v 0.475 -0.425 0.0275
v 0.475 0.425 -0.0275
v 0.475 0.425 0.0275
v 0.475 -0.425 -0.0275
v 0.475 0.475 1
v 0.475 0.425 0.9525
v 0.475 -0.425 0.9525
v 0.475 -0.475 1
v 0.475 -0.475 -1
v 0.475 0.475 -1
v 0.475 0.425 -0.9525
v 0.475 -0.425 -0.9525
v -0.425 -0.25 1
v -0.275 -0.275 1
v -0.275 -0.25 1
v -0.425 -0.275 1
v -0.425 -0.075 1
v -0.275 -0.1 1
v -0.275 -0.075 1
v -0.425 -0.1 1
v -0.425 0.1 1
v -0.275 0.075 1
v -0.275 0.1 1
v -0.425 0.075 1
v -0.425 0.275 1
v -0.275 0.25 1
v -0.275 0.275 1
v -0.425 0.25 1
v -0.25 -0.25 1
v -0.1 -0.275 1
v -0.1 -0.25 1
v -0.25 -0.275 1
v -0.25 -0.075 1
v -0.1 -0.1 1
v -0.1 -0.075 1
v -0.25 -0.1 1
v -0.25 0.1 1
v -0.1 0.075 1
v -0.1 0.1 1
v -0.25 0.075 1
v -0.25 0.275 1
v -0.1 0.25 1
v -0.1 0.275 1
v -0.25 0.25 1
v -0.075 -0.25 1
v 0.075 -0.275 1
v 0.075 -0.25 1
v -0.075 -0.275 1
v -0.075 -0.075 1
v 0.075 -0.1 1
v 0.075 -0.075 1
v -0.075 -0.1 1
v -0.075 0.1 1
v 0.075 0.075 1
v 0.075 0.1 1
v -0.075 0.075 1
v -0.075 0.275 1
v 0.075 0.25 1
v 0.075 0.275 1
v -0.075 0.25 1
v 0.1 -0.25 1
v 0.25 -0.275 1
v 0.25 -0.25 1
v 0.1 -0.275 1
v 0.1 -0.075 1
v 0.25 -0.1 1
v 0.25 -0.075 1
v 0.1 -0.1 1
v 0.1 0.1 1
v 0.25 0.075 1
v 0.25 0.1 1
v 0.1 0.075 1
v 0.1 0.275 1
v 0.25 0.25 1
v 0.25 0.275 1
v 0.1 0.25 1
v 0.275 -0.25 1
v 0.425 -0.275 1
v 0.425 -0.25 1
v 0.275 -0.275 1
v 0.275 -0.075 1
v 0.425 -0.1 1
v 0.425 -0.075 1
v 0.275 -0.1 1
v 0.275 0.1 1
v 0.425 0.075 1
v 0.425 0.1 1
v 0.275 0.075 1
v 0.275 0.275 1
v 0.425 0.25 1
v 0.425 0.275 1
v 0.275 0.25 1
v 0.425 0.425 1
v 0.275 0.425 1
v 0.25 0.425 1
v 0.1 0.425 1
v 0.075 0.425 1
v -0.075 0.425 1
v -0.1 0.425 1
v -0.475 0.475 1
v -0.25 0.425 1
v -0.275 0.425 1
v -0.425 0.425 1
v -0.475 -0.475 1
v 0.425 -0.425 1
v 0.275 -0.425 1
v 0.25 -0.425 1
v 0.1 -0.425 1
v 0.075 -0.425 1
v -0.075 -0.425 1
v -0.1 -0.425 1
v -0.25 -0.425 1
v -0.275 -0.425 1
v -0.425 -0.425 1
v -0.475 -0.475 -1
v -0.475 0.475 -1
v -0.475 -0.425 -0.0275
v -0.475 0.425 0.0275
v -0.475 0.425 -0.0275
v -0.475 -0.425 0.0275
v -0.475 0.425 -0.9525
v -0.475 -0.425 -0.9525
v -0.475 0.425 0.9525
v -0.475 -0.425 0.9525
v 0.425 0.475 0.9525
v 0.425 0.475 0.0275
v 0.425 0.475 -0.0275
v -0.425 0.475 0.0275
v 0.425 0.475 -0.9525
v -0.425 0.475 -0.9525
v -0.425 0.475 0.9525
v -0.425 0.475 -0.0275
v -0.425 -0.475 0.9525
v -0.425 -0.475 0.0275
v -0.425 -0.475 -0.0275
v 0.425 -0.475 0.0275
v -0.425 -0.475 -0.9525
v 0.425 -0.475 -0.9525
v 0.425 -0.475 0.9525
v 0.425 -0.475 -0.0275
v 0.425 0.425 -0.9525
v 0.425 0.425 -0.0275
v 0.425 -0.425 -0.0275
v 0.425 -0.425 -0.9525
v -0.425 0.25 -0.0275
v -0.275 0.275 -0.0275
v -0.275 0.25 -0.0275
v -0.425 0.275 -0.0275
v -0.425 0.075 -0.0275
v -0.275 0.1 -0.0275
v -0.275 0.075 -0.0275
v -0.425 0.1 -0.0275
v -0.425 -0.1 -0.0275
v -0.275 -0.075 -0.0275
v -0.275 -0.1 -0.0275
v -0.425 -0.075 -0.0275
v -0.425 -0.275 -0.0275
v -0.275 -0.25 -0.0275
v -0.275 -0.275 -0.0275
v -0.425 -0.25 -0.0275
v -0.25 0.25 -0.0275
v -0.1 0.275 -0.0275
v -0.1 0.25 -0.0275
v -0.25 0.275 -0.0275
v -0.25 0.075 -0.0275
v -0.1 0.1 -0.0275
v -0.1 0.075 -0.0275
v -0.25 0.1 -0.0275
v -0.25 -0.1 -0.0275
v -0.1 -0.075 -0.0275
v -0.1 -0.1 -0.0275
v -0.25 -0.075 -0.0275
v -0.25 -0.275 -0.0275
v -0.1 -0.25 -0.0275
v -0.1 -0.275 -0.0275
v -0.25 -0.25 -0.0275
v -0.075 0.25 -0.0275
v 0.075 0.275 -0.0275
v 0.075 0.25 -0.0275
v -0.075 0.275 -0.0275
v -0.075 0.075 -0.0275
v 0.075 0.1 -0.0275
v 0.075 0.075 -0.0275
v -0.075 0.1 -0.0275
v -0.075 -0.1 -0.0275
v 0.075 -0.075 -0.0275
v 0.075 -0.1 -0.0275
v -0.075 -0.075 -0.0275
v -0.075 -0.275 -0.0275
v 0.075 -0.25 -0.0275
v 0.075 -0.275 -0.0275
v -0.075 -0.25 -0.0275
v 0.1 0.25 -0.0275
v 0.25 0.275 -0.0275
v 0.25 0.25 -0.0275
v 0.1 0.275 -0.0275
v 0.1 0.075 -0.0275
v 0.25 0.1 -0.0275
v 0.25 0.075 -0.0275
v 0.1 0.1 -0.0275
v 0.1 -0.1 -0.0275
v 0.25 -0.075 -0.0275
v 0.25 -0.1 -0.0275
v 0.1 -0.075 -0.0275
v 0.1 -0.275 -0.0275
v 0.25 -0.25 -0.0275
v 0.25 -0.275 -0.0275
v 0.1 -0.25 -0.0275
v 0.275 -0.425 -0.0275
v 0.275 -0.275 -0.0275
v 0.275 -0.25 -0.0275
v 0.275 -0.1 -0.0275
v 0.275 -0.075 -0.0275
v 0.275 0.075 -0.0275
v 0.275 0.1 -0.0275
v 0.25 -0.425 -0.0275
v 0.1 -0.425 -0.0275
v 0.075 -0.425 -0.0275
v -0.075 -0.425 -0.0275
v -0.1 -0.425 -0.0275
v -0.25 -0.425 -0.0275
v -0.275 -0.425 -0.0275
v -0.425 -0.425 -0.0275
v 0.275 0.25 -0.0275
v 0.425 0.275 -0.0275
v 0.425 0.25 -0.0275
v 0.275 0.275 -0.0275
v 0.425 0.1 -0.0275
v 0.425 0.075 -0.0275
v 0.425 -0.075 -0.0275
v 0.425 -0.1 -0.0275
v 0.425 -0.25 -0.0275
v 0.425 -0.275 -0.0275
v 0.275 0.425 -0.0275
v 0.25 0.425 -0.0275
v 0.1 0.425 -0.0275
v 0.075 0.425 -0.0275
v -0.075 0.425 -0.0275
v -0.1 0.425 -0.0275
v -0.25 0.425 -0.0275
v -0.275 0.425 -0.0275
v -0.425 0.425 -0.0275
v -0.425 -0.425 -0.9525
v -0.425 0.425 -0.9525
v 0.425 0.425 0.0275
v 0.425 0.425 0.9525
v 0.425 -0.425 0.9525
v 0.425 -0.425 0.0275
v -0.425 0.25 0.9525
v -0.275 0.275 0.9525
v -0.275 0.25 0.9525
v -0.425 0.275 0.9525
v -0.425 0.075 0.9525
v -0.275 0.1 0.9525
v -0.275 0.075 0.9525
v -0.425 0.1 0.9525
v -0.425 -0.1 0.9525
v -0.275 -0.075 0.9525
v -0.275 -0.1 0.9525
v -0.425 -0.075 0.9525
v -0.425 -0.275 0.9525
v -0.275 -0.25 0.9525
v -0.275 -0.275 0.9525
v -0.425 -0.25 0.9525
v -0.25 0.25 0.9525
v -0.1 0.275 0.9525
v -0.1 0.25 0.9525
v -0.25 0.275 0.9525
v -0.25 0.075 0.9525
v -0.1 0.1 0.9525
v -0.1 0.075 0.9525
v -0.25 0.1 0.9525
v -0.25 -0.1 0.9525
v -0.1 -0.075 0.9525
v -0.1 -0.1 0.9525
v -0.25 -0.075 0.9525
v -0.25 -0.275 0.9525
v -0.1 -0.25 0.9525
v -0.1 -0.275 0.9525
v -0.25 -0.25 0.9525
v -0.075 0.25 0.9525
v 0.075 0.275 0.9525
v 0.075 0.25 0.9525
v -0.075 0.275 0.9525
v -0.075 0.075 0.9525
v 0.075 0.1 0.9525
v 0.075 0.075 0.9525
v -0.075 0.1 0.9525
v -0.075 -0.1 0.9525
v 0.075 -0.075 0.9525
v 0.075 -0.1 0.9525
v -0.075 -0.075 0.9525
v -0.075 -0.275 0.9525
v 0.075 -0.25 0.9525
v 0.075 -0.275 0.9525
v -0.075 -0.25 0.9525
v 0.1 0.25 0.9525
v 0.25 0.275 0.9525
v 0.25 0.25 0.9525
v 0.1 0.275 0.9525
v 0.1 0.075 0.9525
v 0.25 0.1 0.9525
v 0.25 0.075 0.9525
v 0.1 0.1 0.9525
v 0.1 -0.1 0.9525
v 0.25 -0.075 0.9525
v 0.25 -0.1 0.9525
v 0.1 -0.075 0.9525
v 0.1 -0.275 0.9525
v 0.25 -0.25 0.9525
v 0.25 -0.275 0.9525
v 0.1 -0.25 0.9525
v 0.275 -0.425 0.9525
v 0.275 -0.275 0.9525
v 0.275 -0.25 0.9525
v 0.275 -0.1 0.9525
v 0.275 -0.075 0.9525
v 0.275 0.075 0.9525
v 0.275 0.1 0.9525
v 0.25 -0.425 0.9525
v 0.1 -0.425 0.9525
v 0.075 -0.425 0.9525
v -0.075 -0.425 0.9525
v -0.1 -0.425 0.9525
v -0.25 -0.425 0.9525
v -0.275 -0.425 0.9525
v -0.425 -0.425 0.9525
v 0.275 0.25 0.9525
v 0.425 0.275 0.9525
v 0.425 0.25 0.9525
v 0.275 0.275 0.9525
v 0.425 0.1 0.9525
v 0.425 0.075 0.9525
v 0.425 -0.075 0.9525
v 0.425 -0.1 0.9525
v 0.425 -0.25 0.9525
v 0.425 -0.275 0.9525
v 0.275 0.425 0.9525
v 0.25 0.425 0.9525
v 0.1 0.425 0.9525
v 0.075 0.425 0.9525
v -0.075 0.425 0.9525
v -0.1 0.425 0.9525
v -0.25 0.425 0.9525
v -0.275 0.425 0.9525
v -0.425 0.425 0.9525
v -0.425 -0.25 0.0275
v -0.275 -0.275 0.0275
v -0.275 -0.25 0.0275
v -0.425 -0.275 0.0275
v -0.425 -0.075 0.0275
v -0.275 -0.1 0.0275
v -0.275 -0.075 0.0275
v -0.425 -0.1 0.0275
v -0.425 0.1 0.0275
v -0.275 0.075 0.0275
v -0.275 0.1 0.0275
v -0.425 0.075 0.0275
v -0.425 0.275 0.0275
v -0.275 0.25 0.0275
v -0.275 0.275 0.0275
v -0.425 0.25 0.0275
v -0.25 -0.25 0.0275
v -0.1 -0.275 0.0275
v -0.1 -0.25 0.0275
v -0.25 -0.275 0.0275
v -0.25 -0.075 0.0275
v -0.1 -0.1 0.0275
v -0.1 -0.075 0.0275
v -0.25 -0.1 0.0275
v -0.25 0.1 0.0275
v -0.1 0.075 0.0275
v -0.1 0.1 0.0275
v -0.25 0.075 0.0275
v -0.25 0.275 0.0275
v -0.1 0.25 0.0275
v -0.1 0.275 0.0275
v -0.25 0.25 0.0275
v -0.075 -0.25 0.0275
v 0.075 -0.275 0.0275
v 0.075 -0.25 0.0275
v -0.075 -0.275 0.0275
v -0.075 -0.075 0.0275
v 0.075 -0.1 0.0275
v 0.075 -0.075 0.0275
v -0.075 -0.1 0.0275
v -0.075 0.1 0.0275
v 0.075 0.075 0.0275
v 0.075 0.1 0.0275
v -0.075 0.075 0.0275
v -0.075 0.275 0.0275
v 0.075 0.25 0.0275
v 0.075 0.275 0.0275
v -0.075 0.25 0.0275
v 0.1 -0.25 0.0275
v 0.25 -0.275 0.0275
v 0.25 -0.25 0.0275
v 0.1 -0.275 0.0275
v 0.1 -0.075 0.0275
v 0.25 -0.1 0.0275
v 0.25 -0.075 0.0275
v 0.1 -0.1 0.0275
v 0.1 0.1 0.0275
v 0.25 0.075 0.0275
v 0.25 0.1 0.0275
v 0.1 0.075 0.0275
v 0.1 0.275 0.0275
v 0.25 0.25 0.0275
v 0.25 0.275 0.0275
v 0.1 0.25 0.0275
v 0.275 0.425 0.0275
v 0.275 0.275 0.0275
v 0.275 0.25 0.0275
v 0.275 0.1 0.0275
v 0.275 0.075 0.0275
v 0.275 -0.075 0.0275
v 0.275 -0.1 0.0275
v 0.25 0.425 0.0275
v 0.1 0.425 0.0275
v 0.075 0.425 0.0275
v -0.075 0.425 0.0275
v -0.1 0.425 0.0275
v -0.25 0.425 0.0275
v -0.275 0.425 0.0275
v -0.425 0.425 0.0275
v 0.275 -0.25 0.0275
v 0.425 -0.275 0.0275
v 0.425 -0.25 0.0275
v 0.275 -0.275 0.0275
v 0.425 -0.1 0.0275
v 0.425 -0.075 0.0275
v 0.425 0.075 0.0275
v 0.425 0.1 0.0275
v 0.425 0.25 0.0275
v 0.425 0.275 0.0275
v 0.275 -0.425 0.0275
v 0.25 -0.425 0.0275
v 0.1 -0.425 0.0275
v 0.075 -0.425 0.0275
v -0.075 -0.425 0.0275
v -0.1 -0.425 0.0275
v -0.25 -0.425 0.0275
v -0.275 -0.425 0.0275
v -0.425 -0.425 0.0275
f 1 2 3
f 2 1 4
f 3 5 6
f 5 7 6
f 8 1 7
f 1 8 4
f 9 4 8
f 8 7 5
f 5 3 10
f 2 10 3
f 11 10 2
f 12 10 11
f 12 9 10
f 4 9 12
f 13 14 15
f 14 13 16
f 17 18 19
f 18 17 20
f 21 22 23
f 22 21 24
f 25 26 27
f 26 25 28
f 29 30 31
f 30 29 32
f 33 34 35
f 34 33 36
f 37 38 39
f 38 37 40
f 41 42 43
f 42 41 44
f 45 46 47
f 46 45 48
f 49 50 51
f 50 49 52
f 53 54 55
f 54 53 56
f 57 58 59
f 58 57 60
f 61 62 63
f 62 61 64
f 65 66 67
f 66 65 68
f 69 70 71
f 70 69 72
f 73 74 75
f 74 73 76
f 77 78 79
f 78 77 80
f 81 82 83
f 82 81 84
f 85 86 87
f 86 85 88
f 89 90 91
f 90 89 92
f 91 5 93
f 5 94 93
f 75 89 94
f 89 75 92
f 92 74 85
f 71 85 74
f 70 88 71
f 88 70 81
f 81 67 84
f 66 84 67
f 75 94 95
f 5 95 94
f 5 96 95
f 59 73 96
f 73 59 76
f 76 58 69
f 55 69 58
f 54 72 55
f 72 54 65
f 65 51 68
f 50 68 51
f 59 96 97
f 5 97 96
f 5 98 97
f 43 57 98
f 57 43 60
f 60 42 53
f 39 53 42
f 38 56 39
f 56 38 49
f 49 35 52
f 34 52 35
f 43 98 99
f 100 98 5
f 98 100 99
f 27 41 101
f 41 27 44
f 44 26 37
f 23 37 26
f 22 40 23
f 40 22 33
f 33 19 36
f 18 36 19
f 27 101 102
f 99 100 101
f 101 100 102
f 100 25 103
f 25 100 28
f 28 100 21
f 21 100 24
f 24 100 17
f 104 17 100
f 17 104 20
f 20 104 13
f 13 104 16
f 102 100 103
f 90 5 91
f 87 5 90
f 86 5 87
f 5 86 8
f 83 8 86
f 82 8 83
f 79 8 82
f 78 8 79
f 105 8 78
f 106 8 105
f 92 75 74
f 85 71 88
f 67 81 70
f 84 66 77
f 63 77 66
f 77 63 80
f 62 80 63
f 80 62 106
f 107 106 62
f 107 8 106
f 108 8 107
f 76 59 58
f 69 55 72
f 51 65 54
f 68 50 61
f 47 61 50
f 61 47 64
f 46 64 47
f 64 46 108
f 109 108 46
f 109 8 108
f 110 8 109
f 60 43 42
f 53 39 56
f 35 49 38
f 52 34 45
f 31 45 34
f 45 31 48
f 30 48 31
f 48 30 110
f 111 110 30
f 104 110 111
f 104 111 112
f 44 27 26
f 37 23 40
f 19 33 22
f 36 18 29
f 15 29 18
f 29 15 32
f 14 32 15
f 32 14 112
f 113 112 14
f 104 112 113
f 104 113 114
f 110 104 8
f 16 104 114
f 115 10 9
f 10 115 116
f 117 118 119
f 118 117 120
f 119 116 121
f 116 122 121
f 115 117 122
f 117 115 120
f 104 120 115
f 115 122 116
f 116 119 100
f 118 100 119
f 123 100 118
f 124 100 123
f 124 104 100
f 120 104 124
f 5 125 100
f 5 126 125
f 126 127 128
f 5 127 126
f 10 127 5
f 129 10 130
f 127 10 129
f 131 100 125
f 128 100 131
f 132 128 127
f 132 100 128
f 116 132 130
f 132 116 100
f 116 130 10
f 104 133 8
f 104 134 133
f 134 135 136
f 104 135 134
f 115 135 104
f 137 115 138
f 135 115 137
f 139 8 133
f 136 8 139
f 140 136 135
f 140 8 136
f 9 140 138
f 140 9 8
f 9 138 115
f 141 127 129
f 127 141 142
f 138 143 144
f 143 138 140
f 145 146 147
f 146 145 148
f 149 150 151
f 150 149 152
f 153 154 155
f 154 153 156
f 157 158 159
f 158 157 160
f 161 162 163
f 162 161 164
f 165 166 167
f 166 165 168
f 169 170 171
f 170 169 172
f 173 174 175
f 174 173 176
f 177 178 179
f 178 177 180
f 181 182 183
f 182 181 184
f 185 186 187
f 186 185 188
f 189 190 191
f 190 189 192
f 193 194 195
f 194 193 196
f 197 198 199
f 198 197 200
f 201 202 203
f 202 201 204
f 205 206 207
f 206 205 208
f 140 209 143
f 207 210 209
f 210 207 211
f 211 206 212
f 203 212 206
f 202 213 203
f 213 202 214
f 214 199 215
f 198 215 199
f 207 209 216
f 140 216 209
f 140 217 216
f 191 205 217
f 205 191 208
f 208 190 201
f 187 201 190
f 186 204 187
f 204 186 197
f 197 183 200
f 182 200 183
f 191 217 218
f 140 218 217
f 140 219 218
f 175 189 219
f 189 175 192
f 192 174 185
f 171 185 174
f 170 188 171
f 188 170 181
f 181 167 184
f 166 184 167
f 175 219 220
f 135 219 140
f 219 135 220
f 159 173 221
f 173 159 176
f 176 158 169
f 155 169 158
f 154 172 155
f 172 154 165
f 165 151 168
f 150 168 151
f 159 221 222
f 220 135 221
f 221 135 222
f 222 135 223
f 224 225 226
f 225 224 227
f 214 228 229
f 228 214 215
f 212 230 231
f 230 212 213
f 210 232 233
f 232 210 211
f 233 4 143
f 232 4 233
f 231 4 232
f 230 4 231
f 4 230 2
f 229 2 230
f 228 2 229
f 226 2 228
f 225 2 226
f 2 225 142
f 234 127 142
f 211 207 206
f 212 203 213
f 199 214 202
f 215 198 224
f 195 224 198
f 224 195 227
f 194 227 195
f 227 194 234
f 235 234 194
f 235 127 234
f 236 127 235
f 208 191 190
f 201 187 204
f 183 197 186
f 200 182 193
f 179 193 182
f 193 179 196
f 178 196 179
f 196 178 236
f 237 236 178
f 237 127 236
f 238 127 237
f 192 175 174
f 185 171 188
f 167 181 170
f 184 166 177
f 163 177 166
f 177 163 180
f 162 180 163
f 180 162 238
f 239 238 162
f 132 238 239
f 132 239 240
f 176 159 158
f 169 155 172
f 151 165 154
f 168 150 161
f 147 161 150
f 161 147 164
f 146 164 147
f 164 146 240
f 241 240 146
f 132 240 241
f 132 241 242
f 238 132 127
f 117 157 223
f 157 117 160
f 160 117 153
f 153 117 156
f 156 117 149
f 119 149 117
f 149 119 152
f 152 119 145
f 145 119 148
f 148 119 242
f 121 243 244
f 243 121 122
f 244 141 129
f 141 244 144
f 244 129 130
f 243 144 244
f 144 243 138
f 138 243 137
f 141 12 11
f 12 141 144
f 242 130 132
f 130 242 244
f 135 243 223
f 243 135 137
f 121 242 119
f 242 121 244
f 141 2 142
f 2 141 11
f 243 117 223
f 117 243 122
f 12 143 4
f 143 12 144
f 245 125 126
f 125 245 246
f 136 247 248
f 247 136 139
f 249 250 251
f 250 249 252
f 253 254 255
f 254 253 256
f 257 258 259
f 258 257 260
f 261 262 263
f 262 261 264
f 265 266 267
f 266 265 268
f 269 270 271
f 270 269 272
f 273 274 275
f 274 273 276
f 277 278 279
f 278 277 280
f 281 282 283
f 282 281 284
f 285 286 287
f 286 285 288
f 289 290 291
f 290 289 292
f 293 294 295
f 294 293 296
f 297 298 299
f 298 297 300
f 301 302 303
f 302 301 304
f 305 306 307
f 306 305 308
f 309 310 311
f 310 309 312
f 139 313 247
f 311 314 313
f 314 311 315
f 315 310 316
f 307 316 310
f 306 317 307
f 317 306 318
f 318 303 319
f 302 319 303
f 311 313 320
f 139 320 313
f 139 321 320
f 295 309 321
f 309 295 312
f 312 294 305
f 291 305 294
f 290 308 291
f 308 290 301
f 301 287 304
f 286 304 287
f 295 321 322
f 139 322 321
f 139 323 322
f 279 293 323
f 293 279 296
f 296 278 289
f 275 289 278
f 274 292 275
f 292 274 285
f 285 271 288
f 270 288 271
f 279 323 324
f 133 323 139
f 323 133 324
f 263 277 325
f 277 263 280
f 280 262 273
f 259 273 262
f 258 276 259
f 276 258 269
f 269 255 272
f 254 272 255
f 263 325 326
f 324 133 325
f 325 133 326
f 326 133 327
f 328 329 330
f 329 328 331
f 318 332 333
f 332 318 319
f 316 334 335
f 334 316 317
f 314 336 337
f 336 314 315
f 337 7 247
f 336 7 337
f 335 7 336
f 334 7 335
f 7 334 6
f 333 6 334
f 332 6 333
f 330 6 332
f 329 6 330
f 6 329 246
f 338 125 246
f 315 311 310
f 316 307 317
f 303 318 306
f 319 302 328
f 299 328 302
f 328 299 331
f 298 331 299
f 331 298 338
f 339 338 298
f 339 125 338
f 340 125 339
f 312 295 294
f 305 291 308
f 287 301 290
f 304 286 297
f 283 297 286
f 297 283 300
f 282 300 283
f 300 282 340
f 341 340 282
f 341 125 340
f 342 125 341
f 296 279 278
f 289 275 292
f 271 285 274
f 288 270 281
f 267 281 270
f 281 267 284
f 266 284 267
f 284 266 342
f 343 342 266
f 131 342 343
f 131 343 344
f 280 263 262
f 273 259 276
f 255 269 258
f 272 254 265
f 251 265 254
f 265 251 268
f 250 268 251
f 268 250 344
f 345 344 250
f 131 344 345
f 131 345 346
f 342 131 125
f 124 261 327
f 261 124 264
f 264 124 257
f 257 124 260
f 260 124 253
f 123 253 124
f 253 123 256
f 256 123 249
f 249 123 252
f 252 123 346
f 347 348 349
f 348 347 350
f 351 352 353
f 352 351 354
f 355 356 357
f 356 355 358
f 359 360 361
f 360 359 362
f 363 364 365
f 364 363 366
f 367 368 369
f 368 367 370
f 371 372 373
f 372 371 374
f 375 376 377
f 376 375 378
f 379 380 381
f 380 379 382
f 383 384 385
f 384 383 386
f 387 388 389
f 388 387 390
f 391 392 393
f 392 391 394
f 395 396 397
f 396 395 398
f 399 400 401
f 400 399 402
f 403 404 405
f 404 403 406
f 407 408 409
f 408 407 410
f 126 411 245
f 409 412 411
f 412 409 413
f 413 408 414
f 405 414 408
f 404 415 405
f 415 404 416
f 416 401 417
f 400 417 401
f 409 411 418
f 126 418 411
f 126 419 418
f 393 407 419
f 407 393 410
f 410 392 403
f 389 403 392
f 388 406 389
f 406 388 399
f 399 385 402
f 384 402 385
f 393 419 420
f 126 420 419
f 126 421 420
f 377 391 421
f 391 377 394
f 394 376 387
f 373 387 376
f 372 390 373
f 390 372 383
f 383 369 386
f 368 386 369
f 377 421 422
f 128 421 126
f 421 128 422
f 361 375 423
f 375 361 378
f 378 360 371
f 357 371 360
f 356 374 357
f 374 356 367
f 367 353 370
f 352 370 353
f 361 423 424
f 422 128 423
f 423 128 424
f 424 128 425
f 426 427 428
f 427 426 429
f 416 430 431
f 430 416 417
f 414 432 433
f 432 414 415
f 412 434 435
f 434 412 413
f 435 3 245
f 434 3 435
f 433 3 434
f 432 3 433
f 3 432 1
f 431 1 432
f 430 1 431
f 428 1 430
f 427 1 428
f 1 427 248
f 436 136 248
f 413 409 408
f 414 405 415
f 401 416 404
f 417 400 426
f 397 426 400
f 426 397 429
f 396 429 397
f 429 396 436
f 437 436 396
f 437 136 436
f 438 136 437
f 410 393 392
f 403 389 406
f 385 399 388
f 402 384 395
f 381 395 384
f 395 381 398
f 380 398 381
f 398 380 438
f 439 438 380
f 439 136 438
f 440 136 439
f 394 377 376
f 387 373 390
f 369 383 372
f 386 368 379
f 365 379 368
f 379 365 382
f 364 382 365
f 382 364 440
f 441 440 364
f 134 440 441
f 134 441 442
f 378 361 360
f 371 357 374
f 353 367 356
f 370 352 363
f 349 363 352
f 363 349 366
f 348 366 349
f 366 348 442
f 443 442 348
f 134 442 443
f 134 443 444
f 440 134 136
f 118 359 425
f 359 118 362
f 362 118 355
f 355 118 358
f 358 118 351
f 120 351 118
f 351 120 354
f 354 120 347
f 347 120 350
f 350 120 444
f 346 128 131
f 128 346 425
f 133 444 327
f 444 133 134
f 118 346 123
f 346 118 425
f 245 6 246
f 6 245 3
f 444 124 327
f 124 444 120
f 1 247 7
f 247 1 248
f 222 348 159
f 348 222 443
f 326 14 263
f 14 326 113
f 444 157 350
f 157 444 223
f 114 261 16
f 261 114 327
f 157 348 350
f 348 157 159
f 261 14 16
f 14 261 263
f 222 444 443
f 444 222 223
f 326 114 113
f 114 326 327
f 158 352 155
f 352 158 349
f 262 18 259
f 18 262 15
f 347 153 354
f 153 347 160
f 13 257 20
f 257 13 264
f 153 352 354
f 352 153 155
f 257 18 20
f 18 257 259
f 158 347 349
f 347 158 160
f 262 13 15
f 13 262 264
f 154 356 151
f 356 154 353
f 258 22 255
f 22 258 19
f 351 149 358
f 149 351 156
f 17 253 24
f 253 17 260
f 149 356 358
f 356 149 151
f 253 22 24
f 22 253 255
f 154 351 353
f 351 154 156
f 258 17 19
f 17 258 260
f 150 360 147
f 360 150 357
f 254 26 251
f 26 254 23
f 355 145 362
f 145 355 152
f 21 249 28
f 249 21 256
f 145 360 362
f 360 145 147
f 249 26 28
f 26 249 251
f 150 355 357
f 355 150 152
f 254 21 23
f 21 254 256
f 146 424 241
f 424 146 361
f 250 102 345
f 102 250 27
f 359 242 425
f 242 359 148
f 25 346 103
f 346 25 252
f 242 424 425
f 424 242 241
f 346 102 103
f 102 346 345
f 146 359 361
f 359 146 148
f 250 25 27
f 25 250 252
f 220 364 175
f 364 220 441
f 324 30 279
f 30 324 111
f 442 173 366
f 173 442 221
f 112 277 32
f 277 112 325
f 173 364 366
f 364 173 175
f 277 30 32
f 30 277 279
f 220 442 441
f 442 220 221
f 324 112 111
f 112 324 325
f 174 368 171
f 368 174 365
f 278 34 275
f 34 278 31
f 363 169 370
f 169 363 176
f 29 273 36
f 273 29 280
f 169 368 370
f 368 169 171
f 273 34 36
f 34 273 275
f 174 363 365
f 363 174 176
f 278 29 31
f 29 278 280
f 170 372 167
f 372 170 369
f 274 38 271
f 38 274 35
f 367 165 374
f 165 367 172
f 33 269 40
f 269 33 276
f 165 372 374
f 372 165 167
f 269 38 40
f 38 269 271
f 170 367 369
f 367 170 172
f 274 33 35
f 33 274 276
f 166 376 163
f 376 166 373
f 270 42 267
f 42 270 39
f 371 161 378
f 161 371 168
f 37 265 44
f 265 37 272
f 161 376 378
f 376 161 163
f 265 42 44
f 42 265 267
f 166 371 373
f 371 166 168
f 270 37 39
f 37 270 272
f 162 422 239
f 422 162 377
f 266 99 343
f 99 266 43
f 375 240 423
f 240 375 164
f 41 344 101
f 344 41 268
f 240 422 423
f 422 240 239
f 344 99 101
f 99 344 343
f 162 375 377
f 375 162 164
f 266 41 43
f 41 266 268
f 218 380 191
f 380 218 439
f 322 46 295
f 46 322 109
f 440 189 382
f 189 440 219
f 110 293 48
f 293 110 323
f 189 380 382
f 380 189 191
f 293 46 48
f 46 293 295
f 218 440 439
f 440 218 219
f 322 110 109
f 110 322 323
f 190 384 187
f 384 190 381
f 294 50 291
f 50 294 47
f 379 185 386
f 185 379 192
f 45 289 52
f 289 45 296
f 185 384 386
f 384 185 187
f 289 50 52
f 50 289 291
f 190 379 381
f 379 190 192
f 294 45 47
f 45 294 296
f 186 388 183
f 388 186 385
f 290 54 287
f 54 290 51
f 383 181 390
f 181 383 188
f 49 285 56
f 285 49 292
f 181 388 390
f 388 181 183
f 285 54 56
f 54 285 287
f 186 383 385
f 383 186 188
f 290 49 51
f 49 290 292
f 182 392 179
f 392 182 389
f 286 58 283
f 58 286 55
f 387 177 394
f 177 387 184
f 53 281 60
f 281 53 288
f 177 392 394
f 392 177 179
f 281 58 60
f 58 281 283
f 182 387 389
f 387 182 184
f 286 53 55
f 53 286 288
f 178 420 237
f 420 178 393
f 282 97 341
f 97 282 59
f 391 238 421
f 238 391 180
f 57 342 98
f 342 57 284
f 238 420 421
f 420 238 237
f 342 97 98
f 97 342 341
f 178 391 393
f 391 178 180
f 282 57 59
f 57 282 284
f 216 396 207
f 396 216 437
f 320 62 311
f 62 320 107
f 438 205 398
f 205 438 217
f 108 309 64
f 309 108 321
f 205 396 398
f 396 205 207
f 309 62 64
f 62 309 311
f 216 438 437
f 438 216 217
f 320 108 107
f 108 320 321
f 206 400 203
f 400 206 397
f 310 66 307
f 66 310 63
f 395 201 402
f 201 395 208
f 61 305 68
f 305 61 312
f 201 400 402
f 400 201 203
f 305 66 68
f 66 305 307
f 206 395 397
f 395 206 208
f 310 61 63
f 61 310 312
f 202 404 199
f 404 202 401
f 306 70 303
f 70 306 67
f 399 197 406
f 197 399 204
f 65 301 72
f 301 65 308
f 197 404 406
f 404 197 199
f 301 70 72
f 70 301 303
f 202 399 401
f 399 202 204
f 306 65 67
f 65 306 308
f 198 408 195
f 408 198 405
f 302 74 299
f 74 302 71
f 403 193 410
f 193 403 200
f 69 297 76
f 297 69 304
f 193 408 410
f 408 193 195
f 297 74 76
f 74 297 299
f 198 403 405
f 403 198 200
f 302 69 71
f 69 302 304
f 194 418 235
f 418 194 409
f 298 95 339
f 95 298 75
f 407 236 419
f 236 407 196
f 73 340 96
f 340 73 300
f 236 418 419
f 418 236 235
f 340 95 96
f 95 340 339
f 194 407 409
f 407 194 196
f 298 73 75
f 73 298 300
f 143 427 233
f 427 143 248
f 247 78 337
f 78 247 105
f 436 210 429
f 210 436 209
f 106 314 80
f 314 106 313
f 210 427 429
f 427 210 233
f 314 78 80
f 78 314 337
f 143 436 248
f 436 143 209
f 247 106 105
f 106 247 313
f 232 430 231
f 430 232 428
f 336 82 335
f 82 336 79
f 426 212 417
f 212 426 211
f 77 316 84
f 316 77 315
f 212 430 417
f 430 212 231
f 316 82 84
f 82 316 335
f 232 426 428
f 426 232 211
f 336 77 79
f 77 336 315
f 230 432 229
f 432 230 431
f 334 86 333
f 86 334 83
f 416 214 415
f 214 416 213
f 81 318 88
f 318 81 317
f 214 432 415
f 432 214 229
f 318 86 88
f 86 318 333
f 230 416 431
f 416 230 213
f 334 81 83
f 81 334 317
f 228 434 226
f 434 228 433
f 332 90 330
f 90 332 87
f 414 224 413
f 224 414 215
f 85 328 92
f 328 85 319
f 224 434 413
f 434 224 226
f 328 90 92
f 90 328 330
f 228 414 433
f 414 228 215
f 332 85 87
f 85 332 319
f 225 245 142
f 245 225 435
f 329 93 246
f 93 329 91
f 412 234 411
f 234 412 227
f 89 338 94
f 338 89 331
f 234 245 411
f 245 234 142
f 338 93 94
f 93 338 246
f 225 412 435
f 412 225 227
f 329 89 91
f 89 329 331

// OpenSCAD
use <lib.scad>

module frame() {
	difference() {
		box([0.95,0.95,2.0]);
		translate([0,0,-0.49]) box([0.85,1,0.925]);
		translate([0,0,-0.49]) box([1,0.85,0.925]);
		translate([0,0, 0.49]) box([0.85,1,0.925]);
		translate([0,0, 0.49]) box([1,0.85,0.925]);
	}
}

module gaps() {
	for (i = [-2:1:2])
		for (j = [-2:1:2])
			translate([i*0.175,j*0.175,0.4]) box([0.15,0.15,1.5]);
}

module frameLD() {
	difference() {
		frame();
		gaps();
	}
}

module frameHD() {
	difference() {
		minkowskiOutsideRound(0.01,$fn=8) frame();
		gaps();
	}
}

frameLD();
